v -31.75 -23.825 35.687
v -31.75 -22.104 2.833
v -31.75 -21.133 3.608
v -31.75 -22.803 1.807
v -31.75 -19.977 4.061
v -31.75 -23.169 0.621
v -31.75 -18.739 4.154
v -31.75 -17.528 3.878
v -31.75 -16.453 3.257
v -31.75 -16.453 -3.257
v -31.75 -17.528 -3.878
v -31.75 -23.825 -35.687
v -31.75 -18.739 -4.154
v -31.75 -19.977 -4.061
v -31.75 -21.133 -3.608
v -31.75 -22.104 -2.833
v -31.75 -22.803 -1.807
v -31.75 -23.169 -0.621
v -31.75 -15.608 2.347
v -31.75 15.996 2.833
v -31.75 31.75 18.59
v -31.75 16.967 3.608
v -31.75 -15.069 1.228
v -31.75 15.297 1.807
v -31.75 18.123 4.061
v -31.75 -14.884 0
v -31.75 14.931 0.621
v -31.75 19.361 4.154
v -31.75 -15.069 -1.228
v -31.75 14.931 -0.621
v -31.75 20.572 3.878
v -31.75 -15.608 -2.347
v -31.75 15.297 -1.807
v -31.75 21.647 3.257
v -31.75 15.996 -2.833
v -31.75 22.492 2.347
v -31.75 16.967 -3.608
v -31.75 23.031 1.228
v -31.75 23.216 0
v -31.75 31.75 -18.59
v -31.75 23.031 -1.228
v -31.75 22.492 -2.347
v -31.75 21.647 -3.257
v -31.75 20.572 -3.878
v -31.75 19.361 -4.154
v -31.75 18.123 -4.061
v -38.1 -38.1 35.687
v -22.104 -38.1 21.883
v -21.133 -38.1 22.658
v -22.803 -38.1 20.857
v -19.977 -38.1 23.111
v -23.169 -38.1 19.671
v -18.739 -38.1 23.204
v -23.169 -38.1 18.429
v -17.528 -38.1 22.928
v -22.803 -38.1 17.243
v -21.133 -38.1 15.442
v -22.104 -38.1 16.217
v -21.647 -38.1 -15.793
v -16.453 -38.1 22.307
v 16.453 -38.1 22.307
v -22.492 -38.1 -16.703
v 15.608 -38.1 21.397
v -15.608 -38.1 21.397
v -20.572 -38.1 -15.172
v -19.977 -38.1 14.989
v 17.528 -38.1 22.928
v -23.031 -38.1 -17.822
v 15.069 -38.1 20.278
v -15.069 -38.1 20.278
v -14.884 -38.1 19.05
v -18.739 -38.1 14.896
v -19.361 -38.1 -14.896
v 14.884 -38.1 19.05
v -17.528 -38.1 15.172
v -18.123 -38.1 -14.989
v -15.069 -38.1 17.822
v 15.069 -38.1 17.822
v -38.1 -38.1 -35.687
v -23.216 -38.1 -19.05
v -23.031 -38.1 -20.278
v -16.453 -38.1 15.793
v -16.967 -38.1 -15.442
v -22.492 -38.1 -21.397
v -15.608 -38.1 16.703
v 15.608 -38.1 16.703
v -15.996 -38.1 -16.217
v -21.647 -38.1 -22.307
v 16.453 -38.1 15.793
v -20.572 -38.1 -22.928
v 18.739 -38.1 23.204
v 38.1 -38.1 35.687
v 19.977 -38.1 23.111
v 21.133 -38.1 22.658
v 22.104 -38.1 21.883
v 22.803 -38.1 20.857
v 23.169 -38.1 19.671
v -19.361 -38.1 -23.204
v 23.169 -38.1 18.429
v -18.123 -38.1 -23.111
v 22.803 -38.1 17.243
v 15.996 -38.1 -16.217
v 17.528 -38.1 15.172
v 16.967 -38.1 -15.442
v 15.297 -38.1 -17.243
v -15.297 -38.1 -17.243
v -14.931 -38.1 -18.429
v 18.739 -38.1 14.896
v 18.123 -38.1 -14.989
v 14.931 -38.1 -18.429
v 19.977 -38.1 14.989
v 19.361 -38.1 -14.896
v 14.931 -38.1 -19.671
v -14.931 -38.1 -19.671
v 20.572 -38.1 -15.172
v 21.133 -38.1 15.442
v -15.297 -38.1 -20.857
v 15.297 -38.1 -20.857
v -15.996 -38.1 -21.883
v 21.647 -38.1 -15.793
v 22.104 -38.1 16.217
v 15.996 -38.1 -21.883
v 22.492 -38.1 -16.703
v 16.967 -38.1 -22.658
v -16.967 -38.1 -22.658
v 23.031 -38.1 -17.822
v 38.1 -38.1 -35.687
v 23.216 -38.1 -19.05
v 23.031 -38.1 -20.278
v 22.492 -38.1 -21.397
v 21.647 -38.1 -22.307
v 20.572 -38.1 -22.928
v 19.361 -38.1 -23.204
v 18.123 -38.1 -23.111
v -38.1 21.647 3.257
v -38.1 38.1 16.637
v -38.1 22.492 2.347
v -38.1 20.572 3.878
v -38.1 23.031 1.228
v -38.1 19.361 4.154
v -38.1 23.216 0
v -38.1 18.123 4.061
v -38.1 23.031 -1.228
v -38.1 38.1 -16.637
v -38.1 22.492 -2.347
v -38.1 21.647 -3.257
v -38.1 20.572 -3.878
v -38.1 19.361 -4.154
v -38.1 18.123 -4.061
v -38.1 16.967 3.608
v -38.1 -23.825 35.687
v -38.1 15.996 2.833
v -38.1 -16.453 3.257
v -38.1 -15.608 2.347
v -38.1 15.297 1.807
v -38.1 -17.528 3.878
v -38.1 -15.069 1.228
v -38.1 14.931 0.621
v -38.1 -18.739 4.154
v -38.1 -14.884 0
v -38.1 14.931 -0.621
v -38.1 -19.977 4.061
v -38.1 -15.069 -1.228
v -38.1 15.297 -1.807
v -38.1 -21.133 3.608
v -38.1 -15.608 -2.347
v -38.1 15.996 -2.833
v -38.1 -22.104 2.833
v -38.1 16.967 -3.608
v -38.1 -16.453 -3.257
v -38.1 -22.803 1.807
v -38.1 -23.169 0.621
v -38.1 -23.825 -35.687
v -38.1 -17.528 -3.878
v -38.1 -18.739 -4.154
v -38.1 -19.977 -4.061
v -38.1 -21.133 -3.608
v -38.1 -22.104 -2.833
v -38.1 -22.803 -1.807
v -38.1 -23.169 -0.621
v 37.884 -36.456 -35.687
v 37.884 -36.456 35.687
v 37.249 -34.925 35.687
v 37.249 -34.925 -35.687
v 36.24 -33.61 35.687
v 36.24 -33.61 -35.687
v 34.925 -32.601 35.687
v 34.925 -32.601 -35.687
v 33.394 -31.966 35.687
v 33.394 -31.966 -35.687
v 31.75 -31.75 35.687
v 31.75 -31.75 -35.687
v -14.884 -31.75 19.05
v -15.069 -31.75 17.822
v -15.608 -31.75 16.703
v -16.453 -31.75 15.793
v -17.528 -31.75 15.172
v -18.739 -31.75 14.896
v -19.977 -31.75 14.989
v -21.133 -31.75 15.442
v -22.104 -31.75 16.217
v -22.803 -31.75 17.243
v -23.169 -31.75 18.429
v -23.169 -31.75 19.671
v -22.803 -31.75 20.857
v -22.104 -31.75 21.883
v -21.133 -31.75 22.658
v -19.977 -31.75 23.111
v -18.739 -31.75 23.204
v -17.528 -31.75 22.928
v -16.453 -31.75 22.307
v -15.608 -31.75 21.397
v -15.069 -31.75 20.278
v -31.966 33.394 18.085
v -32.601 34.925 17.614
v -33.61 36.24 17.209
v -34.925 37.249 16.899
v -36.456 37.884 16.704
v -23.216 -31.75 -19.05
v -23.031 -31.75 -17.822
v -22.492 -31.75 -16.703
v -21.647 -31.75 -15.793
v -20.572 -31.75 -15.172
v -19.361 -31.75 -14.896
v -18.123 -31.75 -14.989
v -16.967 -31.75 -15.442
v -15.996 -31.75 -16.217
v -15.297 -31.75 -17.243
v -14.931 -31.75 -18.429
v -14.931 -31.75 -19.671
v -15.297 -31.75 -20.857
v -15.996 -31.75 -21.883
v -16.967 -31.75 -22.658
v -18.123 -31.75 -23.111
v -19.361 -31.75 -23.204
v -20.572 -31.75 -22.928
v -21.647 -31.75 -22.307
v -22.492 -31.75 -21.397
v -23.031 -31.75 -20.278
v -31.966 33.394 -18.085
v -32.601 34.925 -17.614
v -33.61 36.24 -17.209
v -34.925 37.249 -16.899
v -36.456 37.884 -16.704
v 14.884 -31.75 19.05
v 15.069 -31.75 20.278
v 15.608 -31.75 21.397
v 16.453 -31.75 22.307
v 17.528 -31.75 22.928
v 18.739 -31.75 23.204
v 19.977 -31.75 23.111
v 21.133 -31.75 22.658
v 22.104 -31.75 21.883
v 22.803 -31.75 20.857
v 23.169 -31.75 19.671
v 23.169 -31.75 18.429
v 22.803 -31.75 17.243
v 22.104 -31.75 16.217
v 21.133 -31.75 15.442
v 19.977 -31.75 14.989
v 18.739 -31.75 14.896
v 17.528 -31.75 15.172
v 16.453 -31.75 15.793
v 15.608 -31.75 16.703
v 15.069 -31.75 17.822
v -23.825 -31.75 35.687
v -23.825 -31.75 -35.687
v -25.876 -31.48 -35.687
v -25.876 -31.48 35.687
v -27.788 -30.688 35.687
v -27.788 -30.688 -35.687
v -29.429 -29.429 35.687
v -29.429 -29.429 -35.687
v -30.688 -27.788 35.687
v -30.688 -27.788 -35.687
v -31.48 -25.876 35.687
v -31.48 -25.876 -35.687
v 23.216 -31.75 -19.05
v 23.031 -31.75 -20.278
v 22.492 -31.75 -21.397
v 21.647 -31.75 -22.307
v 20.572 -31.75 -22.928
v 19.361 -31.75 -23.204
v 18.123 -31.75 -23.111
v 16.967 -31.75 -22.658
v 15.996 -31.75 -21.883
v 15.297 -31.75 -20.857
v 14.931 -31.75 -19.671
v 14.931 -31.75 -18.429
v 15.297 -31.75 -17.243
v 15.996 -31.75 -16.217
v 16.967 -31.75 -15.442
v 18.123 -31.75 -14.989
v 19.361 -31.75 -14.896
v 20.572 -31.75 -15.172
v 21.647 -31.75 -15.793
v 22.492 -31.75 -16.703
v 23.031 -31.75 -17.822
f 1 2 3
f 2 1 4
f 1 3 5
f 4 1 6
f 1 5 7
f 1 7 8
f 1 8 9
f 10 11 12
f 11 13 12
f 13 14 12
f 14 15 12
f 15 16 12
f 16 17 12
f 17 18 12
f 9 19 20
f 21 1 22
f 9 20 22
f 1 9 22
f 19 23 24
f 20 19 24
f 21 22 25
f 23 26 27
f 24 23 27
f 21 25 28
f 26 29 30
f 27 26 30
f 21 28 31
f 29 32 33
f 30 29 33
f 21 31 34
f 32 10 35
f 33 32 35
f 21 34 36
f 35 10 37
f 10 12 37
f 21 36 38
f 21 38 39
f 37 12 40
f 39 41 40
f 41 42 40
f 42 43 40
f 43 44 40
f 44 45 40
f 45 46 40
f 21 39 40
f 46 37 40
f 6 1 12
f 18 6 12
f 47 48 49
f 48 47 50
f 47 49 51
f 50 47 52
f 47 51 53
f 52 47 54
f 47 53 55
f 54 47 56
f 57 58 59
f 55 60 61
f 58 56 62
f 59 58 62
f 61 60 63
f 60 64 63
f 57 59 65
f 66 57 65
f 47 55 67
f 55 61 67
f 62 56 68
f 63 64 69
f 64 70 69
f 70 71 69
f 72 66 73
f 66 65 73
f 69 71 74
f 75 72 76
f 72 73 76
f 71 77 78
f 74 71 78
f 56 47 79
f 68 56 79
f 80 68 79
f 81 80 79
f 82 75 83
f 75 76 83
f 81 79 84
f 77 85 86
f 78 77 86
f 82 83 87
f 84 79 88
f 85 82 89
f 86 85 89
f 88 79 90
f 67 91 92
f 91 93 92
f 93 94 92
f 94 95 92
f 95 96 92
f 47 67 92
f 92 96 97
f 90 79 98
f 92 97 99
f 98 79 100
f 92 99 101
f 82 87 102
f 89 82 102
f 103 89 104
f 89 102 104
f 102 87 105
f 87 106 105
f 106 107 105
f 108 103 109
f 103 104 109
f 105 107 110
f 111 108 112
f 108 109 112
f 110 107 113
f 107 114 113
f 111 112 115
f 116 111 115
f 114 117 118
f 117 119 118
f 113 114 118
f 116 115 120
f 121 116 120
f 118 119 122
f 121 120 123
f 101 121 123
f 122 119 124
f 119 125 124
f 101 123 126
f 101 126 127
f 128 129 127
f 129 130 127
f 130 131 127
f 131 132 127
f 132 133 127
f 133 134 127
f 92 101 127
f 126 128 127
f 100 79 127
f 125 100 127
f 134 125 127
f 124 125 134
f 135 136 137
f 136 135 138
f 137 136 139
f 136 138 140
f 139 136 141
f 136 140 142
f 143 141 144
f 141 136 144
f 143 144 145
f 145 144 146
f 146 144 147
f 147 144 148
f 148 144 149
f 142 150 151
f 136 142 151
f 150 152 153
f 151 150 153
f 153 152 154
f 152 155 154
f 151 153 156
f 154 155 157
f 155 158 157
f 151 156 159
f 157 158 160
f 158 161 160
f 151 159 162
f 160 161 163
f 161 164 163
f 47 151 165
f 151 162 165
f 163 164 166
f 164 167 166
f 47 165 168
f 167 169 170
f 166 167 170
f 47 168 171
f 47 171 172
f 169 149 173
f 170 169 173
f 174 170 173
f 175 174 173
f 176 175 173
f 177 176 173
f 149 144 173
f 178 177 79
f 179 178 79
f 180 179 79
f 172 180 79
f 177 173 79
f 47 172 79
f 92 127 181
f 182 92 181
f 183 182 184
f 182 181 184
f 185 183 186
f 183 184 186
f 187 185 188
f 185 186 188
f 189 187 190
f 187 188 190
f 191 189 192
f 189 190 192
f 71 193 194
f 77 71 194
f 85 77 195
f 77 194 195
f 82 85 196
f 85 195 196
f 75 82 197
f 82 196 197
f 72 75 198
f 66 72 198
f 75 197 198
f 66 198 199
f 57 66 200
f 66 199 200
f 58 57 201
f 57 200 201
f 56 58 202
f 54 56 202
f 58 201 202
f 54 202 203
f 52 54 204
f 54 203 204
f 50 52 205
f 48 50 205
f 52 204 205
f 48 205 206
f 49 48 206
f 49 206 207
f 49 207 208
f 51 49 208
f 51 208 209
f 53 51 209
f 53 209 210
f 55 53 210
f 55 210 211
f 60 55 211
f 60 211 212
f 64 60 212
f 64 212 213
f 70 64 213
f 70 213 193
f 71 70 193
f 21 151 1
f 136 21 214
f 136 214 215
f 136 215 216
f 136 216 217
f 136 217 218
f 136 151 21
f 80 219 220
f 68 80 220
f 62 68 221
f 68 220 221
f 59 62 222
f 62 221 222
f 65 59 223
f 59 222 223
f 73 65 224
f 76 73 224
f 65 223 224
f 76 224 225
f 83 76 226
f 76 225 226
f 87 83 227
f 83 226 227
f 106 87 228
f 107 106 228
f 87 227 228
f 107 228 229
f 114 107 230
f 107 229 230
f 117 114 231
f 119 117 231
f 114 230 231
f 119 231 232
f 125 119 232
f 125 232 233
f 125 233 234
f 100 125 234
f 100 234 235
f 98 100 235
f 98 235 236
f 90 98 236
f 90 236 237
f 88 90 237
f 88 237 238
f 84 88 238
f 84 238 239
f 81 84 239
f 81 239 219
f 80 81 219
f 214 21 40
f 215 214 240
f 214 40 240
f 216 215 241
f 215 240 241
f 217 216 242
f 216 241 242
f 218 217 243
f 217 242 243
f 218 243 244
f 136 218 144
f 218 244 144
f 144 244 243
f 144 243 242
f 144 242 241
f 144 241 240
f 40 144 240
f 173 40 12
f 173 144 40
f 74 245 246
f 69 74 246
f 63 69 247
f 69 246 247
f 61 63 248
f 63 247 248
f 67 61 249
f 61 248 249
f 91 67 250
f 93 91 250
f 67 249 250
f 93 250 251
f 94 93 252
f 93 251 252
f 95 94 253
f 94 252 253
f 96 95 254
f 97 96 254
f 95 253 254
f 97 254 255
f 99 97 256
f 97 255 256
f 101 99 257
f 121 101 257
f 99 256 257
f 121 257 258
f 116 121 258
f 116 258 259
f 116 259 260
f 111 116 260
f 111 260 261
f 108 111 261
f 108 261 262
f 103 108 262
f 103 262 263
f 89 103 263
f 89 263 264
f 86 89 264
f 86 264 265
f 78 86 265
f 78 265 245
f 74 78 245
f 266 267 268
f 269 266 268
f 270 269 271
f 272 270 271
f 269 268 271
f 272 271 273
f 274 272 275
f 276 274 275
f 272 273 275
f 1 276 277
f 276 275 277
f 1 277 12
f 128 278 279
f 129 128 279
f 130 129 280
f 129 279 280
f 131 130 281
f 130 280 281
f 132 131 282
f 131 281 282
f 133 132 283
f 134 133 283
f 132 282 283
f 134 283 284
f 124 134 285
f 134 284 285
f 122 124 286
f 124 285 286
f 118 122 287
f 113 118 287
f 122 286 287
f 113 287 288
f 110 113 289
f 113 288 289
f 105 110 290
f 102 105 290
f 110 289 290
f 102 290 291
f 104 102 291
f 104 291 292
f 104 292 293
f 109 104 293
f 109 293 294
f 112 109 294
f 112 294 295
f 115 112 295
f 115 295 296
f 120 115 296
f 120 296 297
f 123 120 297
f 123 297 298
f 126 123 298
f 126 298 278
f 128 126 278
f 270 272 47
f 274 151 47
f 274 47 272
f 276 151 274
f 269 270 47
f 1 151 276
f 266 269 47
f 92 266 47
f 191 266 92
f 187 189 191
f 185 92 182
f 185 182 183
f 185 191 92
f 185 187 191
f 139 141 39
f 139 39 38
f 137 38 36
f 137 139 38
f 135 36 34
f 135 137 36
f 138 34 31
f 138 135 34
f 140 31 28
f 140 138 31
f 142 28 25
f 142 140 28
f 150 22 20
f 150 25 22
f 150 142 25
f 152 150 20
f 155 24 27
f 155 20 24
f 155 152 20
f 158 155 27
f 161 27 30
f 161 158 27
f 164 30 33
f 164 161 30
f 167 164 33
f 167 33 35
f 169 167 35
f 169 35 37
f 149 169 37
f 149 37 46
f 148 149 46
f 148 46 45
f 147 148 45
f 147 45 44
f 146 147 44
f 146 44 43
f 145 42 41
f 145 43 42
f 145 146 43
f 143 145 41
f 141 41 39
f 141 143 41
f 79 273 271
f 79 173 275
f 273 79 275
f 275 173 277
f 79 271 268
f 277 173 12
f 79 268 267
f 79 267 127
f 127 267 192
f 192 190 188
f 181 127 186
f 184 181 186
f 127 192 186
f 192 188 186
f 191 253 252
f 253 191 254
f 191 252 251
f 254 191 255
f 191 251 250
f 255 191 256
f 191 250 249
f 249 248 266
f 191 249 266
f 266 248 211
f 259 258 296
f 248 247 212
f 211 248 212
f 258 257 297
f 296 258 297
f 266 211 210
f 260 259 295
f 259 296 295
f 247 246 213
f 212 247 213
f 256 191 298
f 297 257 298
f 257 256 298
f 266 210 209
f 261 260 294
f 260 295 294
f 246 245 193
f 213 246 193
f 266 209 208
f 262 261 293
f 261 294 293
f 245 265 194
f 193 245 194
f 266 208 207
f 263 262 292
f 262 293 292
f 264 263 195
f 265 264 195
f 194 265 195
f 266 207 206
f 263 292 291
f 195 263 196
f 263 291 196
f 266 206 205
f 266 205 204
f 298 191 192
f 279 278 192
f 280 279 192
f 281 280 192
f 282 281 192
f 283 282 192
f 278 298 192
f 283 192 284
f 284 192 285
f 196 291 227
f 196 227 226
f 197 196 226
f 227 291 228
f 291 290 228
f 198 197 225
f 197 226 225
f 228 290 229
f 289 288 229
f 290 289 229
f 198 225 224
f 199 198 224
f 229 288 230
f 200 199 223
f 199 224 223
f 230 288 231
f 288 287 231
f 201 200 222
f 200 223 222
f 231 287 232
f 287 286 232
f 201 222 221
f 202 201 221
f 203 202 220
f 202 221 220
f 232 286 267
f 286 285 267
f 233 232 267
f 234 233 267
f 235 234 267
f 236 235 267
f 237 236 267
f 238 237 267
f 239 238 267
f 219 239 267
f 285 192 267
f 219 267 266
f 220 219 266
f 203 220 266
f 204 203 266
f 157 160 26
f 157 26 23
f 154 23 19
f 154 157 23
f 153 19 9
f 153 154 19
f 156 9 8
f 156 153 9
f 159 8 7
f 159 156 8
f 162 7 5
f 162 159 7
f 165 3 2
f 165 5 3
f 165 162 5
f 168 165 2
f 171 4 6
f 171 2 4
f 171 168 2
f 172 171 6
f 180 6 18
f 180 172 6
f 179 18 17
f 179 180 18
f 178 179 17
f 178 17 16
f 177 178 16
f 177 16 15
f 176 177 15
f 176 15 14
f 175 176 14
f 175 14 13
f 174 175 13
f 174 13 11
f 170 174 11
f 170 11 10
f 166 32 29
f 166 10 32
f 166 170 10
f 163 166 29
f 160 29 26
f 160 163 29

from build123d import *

# Parameters (mm, degrees)
BOSS_EXTRUDE1_DEPTH      = 35.687
BOSS_EXTRUDE1_DEPTH_BACK = 35.687
CUT_EXTRUDE1_DEPTH       = 88.202032482
CUT_EXTRUDE1_DEPTH_BACK  = 88.202032482
CUT_EXTRUDE2_DEPTH       = 88.202032482
CUT_EXTRUDE2_DEPTH_BACK  = 88.202032482
SKETCH6_R                = 4.1656
SKETCH7_R                = 4.1656
CUT_EXTRUDE3_DEPTH       = 88.202032482


with BuildPart() as part:
    # Sketch4 → Boss-Extrude1 (new, two sides: drawn at the far end of the back side and taken through both)
    with BuildSketch(Plane.XY.offset(-BOSS_EXTRUDE1_DEPTH_BACK)):
        with BuildLine():
            Line((-38.1, 38.1), (-38.1, -38.1))
            Line((-38.1, -38.1), (38.1, -38.1))
            ThreePointArc((38.1, -38.1), (36.240128061, -33.609871939), (31.75, -31.75))
            Line((31.75, -31.75), (-23.8252, -31.75))
            ThreePointArc((-23.8252, -31.75), (-29.42887982, -29.42887982), (-31.75, -23.8252))
            Line((-31.75, -23.8252), (-31.75, 31.75))
            ThreePointArc((-31.75, 31.75), (-33.609871939, 36.240128061), (-38.1, 38.1))
        make_face()
    extrude(amount=BOSS_EXTRUDE1_DEPTH + BOSS_EXTRUDE1_DEPTH_BACK)

    # Sketch5 → Cut-Extrude1 (cut, two sides: drawn at the far end of the back side and taken through both)
    with BuildSketch(Plane(origin=(-31.75, 0, 0), x_dir=(0, 0, -1), z_dir=(1, 0, 0)).offset(-CUT_EXTRUDE1_DEPTH_BACK)):
        Polygon((-35.687, -23.8252), (-16.637, 38.1), (-35.687, 38.1), align=None)
        Polygon((35.687, 38.1), (16.637, 38.1), (35.687, -23.8252), align=None)
    extrude(amount=CUT_EXTRUDE1_DEPTH + CUT_EXTRUDE1_DEPTH_BACK, mode=Mode.SUBTRACT)

    # Sketch6 → Cut-Extrude2 (cut, two sides: drawn at the far end of the back side and taken through both)
    with BuildSketch(Plane(origin=(-31.75, 0, 0), x_dir=(0, 0, -1), z_dir=(1, 0, 0)).offset(-CUT_EXTRUDE2_DEPTH_BACK)):
        with Locations(Location((0, 19.05, 0), (0, 0, 90))):
            Circle(SKETCH6_R)
        with Locations(Location((0, -19.05, 0), (0, 0, 90))):
            Circle(SKETCH6_R)
    extrude(amount=CUT_EXTRUDE2_DEPTH + CUT_EXTRUDE2_DEPTH_BACK, mode=Mode.SUBTRACT)

    # Sketch7 → Cut-Extrude3 (cut, through all)
    with BuildSketch(Plane(origin=(0, -31.75, 0), x_dir=(1, 0, 0), z_dir=(0, 1, 0))):
        with Locations(Location((-19.05, 19.05, 0), (0, 0, 180))):
            Circle(SKETCH7_R)
        with Locations((19.05, 19.05)):
            Circle(SKETCH7_R)
        with Locations(Location((19.05, -19.05, 0), (0, 0, 180))):
            Circle(SKETCH7_R)
        with Locations((-19.05, -19.05)):
            Circle(SKETCH7_R)
    extrude(amount=-CUT_EXTRUDE3_DEPTH, mode=Mode.SUBTRACT)


solid = part.part
